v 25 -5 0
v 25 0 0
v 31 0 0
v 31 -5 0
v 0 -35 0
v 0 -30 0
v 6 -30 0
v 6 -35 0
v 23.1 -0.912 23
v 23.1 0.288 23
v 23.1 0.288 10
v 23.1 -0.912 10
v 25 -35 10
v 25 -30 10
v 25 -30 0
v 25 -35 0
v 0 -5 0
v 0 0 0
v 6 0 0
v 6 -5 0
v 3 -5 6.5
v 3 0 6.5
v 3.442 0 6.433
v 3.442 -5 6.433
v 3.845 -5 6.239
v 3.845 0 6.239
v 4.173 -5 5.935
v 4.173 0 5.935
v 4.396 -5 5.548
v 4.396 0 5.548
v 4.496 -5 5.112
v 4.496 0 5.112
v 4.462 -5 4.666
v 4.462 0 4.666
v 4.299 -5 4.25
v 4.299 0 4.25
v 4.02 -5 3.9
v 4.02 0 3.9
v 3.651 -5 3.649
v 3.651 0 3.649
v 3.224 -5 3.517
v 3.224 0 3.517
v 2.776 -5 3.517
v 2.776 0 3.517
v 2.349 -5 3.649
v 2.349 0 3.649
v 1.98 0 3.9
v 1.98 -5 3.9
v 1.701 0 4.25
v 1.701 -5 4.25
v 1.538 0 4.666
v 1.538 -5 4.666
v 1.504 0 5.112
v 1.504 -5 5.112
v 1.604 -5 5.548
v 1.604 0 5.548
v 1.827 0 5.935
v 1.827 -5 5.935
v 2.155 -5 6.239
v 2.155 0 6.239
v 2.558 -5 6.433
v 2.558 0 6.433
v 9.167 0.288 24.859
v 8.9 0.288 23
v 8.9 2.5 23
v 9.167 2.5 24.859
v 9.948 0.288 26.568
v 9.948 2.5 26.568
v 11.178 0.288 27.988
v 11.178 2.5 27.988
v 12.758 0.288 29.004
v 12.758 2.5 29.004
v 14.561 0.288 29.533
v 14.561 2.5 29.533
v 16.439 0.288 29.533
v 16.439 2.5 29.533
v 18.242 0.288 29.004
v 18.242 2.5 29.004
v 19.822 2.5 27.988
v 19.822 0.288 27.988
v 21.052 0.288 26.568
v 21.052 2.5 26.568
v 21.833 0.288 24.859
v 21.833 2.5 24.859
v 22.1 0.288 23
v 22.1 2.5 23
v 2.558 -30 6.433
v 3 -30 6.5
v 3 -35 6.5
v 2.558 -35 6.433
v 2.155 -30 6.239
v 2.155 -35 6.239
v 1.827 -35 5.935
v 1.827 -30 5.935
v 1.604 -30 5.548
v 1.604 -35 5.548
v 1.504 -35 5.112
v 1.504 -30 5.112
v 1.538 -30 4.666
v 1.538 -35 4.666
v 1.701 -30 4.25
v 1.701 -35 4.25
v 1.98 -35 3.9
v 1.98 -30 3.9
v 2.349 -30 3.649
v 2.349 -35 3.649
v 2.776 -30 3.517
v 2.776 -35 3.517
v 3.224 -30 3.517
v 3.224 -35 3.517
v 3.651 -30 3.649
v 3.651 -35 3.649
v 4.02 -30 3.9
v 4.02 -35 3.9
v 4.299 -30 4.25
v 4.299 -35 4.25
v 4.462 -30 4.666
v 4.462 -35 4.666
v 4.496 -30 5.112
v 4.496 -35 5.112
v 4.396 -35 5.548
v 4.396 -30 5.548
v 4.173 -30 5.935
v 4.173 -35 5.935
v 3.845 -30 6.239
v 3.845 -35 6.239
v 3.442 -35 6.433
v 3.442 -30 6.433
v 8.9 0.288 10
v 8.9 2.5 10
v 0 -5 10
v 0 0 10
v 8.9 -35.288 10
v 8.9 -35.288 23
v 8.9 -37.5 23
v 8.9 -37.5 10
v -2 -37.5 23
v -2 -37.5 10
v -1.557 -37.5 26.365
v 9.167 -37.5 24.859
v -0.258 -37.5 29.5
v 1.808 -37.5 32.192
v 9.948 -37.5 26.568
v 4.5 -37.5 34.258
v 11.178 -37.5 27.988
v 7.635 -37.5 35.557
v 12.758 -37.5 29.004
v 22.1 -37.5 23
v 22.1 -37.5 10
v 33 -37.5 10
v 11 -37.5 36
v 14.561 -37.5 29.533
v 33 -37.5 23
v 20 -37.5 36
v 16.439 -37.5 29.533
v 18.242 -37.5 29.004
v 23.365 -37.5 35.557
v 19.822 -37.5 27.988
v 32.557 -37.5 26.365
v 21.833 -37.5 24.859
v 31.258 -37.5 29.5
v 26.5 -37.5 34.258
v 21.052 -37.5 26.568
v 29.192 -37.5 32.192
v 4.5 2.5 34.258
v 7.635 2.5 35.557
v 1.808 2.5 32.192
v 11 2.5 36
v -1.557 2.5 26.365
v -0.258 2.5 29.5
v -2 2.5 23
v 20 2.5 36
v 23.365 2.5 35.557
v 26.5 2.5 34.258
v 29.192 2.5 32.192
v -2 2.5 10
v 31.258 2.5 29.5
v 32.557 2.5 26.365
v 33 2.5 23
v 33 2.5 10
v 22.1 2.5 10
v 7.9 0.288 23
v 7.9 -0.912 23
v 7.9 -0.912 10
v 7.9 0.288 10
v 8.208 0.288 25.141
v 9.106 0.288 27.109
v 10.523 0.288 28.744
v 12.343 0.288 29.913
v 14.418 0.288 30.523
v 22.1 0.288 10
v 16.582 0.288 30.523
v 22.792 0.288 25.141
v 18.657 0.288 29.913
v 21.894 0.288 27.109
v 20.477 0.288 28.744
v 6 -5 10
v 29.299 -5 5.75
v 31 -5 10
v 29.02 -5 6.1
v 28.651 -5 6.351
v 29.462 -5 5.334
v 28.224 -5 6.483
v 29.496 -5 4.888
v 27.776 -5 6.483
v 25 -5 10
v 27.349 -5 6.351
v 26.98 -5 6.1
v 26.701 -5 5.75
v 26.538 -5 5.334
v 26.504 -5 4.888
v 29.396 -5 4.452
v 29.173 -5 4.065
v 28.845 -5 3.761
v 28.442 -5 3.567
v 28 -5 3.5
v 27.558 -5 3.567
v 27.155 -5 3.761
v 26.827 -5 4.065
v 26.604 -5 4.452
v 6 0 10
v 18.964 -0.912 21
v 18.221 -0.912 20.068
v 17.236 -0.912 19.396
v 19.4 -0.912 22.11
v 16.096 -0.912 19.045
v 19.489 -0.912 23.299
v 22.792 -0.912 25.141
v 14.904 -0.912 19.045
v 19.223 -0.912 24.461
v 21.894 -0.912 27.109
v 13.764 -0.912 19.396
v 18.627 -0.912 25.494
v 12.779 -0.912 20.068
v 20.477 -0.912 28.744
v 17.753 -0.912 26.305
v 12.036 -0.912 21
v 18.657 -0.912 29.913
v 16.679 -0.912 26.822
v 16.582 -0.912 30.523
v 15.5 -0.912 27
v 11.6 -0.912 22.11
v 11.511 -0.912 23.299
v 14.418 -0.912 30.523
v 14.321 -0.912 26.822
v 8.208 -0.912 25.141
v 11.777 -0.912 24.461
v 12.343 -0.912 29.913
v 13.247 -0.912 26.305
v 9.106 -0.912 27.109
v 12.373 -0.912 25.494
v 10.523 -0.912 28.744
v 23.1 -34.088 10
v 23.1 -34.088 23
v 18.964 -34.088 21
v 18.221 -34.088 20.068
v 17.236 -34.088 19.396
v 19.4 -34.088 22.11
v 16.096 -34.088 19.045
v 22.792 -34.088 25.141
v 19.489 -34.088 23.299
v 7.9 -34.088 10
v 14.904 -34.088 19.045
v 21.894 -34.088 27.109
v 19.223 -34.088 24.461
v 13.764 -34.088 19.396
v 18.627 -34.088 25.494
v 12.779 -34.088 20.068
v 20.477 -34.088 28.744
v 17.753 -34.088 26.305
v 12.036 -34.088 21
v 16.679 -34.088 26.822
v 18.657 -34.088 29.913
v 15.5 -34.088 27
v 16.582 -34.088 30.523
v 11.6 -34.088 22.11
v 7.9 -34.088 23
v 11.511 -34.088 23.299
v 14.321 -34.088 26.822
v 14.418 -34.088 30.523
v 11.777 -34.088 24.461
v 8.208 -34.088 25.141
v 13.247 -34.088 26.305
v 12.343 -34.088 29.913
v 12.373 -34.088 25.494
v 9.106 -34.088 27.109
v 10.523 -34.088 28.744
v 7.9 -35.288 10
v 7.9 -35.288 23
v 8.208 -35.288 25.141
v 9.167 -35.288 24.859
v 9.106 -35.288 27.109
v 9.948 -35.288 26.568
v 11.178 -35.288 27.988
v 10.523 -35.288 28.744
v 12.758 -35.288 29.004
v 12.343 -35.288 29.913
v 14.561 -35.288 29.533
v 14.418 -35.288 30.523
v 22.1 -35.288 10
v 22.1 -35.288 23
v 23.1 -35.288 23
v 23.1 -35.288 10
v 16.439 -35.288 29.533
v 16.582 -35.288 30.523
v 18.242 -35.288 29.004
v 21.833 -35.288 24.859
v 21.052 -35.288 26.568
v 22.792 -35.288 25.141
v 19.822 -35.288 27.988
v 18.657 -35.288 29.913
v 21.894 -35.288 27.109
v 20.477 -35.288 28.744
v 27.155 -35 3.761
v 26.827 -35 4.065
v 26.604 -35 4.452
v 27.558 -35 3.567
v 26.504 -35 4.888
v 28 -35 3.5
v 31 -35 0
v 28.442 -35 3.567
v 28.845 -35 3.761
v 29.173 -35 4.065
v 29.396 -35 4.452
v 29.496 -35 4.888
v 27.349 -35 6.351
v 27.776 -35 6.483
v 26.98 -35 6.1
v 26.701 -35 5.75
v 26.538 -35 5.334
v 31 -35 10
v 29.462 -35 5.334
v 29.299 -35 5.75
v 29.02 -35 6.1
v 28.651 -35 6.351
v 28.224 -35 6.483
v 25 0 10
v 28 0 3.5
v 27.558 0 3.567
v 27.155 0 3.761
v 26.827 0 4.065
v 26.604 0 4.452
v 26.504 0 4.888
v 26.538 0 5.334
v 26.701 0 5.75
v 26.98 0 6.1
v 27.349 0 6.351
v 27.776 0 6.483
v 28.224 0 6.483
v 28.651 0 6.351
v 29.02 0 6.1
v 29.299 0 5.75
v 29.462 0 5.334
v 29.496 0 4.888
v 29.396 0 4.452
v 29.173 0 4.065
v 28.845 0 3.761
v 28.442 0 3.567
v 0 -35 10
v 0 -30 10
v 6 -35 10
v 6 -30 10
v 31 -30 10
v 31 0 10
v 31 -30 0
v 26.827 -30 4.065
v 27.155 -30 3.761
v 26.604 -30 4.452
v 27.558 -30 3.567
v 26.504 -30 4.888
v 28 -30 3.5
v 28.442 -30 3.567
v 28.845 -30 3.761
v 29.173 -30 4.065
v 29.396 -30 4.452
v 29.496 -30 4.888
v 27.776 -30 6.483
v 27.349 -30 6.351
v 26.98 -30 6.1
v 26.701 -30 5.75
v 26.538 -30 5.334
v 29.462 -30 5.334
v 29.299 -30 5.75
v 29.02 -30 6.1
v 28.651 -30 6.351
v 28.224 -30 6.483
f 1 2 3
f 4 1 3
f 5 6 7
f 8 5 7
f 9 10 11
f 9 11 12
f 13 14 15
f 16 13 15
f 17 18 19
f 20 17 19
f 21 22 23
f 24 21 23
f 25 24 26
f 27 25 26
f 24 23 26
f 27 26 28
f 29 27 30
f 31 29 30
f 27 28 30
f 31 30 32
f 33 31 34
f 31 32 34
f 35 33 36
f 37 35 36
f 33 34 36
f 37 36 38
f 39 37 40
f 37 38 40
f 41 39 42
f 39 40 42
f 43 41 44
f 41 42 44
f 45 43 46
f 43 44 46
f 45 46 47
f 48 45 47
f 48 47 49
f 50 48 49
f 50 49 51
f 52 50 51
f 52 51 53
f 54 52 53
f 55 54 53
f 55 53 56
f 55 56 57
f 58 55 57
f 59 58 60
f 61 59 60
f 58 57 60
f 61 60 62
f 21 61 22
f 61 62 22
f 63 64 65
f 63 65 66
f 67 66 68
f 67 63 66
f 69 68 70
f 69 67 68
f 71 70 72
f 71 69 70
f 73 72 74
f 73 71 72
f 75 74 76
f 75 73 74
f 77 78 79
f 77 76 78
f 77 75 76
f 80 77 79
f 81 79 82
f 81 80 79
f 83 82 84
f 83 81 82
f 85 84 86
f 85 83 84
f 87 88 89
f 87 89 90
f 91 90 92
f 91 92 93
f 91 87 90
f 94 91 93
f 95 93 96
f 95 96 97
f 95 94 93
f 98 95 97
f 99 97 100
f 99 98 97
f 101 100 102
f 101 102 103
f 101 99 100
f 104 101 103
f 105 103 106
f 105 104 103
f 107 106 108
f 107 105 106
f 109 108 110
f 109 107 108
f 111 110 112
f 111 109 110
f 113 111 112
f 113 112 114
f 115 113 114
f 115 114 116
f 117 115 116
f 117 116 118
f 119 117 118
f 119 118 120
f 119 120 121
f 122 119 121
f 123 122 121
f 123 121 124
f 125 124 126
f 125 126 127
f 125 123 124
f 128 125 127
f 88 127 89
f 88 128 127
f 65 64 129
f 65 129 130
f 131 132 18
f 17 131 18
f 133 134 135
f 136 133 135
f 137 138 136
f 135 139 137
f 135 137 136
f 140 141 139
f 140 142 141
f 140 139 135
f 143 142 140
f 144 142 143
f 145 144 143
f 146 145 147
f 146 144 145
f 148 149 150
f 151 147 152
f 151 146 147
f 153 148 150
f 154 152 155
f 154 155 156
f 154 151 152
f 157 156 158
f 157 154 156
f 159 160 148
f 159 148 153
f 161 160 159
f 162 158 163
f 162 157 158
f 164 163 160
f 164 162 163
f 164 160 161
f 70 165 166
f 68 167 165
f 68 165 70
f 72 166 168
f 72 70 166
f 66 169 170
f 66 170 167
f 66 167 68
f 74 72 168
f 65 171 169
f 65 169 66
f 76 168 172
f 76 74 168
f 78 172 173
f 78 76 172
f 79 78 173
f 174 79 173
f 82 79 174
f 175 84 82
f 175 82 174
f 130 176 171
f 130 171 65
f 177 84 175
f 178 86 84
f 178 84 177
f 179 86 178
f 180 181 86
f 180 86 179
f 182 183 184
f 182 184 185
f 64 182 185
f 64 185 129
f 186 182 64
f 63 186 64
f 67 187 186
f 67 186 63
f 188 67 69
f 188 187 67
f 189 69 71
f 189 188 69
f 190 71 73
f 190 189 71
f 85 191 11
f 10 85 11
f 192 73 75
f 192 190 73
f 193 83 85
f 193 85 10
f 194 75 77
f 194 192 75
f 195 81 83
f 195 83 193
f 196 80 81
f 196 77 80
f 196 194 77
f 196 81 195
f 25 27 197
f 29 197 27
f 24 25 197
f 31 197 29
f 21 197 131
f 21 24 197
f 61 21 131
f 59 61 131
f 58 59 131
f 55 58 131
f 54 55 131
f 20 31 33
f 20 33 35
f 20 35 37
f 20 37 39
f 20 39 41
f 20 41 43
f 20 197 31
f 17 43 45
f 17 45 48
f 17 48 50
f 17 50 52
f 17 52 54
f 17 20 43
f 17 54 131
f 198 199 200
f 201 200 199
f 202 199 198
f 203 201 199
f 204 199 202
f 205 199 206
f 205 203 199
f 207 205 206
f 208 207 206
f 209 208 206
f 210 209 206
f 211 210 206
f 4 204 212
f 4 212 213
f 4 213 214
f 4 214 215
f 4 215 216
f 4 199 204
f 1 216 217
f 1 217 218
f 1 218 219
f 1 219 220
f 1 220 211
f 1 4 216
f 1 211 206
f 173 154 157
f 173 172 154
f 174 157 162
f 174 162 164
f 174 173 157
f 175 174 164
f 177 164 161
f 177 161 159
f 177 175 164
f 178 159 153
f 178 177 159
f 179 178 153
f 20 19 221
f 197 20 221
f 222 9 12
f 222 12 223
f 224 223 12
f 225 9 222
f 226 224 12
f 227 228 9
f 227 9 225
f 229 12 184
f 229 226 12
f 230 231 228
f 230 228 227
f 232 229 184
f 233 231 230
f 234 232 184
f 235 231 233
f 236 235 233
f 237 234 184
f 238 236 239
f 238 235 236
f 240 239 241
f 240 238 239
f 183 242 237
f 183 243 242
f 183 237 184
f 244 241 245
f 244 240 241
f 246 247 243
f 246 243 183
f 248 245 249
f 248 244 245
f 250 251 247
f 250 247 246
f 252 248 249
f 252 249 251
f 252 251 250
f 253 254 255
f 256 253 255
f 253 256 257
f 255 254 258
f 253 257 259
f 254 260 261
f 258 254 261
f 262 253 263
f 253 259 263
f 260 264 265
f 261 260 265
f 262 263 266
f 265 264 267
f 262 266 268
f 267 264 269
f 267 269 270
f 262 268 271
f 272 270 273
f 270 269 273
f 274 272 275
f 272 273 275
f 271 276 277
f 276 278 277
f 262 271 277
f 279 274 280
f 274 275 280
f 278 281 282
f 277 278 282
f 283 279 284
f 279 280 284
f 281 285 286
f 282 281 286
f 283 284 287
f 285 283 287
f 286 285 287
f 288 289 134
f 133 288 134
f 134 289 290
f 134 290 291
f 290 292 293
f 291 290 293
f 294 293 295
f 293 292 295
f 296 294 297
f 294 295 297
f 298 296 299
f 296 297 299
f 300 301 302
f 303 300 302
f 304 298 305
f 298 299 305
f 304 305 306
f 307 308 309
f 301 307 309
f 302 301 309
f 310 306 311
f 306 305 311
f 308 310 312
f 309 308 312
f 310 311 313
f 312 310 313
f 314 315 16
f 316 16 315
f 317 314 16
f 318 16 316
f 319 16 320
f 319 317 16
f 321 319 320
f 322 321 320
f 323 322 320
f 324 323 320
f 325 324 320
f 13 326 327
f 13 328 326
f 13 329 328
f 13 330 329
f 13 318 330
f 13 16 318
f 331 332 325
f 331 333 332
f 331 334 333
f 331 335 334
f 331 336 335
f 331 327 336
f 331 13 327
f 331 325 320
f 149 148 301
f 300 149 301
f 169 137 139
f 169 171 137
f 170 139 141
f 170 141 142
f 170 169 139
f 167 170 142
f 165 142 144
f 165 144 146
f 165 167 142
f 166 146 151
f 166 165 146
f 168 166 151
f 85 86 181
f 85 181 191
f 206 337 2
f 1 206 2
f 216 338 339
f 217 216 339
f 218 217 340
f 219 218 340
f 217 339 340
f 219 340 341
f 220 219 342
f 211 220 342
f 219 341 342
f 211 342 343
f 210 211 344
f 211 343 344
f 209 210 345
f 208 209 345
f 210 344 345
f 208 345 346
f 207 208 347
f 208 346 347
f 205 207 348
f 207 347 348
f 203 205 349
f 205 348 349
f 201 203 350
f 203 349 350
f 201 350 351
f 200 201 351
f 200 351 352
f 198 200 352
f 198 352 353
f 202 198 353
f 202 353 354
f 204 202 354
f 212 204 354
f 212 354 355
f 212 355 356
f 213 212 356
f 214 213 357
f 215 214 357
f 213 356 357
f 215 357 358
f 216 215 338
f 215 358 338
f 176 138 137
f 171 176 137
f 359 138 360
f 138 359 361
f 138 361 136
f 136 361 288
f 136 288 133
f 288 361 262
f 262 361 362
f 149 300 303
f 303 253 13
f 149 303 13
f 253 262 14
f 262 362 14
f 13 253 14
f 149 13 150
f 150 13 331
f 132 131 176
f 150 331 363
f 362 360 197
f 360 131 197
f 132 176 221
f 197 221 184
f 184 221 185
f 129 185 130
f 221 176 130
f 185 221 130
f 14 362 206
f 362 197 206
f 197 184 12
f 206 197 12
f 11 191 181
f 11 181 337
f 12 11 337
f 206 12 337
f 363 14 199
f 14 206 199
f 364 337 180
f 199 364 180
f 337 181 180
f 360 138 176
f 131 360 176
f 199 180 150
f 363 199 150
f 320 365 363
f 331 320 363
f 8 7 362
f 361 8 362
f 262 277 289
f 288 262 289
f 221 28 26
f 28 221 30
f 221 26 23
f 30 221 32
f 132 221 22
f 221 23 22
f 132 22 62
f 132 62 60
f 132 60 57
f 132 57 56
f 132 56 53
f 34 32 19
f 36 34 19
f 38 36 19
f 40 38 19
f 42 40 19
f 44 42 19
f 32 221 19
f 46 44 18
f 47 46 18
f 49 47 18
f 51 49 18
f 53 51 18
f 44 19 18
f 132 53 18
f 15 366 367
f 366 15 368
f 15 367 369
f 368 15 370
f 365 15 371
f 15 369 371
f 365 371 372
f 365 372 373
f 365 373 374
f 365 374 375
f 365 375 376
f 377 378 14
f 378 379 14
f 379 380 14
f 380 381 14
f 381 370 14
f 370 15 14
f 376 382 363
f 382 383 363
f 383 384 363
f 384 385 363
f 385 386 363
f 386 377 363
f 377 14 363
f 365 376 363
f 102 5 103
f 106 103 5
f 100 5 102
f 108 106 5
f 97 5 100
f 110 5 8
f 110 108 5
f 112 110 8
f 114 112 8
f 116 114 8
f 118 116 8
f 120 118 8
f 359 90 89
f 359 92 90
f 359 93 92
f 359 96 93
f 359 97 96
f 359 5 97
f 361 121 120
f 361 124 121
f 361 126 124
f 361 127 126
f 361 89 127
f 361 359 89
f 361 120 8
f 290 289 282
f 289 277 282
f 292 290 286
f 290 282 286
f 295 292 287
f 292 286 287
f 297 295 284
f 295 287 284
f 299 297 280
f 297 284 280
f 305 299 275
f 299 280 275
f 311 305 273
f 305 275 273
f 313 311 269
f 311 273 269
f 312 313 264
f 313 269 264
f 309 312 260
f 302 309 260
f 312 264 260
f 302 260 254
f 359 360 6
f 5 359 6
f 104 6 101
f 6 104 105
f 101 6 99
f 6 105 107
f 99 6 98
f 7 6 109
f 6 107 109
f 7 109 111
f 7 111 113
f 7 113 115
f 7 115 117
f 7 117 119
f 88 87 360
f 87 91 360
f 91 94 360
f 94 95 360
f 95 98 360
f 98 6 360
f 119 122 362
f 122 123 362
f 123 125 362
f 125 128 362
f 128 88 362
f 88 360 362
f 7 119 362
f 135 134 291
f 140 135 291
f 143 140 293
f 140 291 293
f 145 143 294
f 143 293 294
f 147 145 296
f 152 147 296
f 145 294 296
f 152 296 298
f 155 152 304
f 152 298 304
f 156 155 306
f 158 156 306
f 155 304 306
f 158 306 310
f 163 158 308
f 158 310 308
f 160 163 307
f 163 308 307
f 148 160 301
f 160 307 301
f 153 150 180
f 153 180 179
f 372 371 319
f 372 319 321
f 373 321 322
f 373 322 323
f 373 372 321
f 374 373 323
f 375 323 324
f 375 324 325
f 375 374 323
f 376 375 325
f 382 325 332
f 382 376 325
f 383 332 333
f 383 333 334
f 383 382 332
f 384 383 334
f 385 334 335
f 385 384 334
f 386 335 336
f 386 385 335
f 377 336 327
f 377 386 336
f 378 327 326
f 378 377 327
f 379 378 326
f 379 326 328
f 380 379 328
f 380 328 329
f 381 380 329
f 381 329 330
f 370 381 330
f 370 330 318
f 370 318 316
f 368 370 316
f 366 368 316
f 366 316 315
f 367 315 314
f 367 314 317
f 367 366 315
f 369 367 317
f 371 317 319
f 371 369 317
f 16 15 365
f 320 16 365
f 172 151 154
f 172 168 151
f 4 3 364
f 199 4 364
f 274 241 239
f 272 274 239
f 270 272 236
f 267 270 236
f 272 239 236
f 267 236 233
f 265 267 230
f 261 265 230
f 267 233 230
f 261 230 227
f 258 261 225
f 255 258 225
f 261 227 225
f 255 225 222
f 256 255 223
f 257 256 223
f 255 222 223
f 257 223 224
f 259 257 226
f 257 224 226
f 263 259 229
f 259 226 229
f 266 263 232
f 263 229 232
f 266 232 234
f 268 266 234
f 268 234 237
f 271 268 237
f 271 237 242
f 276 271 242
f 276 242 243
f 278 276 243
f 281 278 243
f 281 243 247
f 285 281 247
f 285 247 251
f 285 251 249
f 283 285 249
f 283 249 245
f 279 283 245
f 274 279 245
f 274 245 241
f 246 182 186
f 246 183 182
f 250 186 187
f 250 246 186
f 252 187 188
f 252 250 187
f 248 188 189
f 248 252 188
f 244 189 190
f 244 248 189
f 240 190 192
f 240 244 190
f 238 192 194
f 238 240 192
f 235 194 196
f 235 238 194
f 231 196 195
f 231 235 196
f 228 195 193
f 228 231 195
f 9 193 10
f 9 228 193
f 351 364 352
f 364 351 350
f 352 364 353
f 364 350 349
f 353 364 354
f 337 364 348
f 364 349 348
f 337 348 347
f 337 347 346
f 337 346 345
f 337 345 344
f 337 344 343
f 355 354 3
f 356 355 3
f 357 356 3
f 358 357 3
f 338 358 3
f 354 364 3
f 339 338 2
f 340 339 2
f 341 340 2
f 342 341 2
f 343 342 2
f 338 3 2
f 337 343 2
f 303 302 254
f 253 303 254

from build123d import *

# Parameters (mm, degrees)
SKETCH10_W           = 35
SKETCH10_H           = 26
BOSS_EXTRUDE4_DEPTH  = 2.5
SKETCH1_R            = 1.5
BOSS_EXTRUDE5_DEPTH  = 5
SKETCH11_W           = 35
SKETCH11_H           = 26
BOSS_EXTRUDE6_DEPTH  = 2.5
CUT_EXTRUDE1_START   = -13
CUT_EXTRUDE1_DEPTH   = 56.676105727
SKETCH4_R            = 7.6
CUT_EXTRUDE2_DEPTH   = 1.2
SKETCH5_R            = 6.6
CUT_EXTRUDE3_DEPTH   = 50.27874954
SKETCH12_W           = 35
SKETCH12_H           = 26
BOSS_EXTRUDE7_DEPTH  = 15
SKETCH13_W           = 35
SKETCH13_H           = 26
BOSS_EXTRUDE8_DEPTH  = 7.5
SKETCH14_R           = 1.5
BOSS_EXTRUDE9_DEPTH  = 5
SKETCH15_W           = 35
SKETCH15_H           = 26
BOSS_EXTRUDE10_DEPTH = 2.5
SKETCH8_R            = 4
CUT_EXTRUDE6_DEPTH   = 62.021677757
FILLET1_R            = 13


with BuildPart() as part:
    # Sketch10 → Boss-Extrude4 (new body)
    with BuildSketch(Plane(origin=(0, 0, 0), x_dir=(1, 0, 0), z_dir=(0, 1, 0))):
        with Locations((15.5, -23)):
            Rectangle(SKETCH10_W, SKETCH10_H)
    extrude(amount=BOSS_EXTRUDE4_DEPTH)

    # Sketch1 → Boss-Extrude5 (add)
    with BuildSketch(Plane(origin=(0, 0, 0), x_dir=(1, 0, 0), z_dir=(0, 1, 0))):
        Polygon((0, 0), (6, 0), (6, -10), (25, -10), (25, 0), (31, 0), (31, -10), (33, -10), (33, -36), (-2, -36), (-2, -10), (0, -10), align=None)
        with Locations(Location((3, -5, 0), (0, 0, 270))):
            Circle(SKETCH1_R, mode=Mode.SUBTRACT)
        with Locations(Location((28, -5, 0), (0, 0, 90))):
            Circle(SKETCH1_R, mode=Mode.SUBTRACT)
    extrude(amount=-BOSS_EXTRUDE5_DEPTH)

    # Sketch11 → Boss-Extrude6 (add)
    with BuildSketch(Plane.XZ.offset(5)):
        with Locations((15.5, 23)):
            Rectangle(SKETCH11_W, SKETCH11_H)
    extrude(amount=BOSS_EXTRUDE6_DEPTH)

    # Sketch3 → Cut-Extrude1 (cut)
    with BuildSketch(Plane(origin=(0, 0, 10), x_dir=(-1, 0, 0), z_dir=(0, 0, -1)).offset(CUT_EXTRUDE1_START)):
        Polygon((-22.1, 2.5), (-22.1, 0.2875), (-23.1, 0.2875), (-23.1, -0.9125), (-15.5, -0.9125), (-7.9, -0.9125), (-7.9, 0.2875), (-8.9, 0.2875), (-8.9, 2.5), align=None)
    cut_extrude1 = extrude(amount=CUT_EXTRUDE1_DEPTH, mode=Mode.SUBTRACT)

    # Sketch4 → Cut-Extrude2 (cut)
    with BuildSketch(Plane(origin=(0, -0.9125, 0), x_dir=(1, 0, 0), z_dir=(0, 1, 0))):
        with Locations((15.5, -23)):
            Circle(SKETCH4_R)
    cut_extrude2 = extrude(amount=CUT_EXTRUDE2_DEPTH, mode=Mode.SUBTRACT)

    # Sketch5 → Cut-Extrude3 (cut, through all)
    with BuildSketch(Plane(origin=(0, -0.9125, 0), x_dir=(1, 0, 0), z_dir=(0, 1, 0))):
        with Locations((15.5, -23)):
            Circle(SKETCH5_R)
    cut_extrude3 = extrude(amount=CUT_EXTRUDE3_DEPTH, mode=Mode.SUBTRACT)

    # Sketch12 → Boss-Extrude7 (add)
    with BuildSketch(Plane.XZ.offset(7.5)):
        with Locations((15.5, 23)):
            Rectangle(SKETCH12_W, SKETCH12_H)
    extrude(amount=BOSS_EXTRUDE7_DEPTH)

    # Sketch13 → Boss-Extrude8 (add)
    with BuildSketch(Plane.XZ.offset(22.5)):
        with Locations((15.5, 23)):
            Rectangle(SKETCH13_W, SKETCH13_H)
    extrude(amount=BOSS_EXTRUDE8_DEPTH)

    # Sketch14 → Boss-Extrude9 (add)
    with BuildSketch(Plane.XZ.offset(30)):
        Polygon((0, 0), (6, 0), (6, 10), (25, 10), (25, 0), (31, 0), (31, 10), (33, 10), (33, 36), (-2, 36), (-2, 10), (0, 10), align=None)
        with Locations(Location((3, 5, 0), (0, 0, 90))):
            Circle(SKETCH14_R, mode=Mode.SUBTRACT)
        with Locations(Location((28, 5, 0), (0, 0, 270))):
            Circle(SKETCH14_R, mode=Mode.SUBTRACT)
    extrude(amount=BOSS_EXTRUDE9_DEPTH)

    # Sketch15 → Boss-Extrude10 (add)
    with BuildSketch(Plane.XZ.offset(35)):
        with Locations((15.5, 23)):
            Rectangle(SKETCH15_W, SKETCH15_H)
    extrude(amount=BOSS_EXTRUDE10_DEPTH)

    # Mirror8: Cut-Extrude1, Cut-Extrude2, Cut-Extrude3 across plane
    add(cut_extrude1.mirror(Plane.ZX.offset(-17.5)), mode=Mode.SUBTRACT)
    add(cut_extrude2.mirror(Plane.ZX.offset(-17.5)), mode=Mode.SUBTRACT)
    add(cut_extrude3.mirror(Plane.ZX.offset(-17.5)), mode=Mode.SUBTRACT)

    # Sketch8 → Cut-Extrude6 (cut, through all)
    with BuildSketch(Plane(origin=(0, -0.9125, 0), x_dir=(1, 0, 0), z_dir=(0, 1, 0))):
        with Locations(Location((15.5, -23, 0), (0, 0, 270))):
            Circle(SKETCH8_R)
    extrude(amount=-CUT_EXTRUDE6_DEPTH, mode=Mode.SUBTRACT)

    # Fillet1
    fillet1_edges = [part.edges().sort_by_distance(p)[0] for p in [
        (33, -17.5, 36),
        (-2, -17.5, 36),
    ]]
    fillet(fillet1_edges, radius=FILLET1_R)


solid = part.part
